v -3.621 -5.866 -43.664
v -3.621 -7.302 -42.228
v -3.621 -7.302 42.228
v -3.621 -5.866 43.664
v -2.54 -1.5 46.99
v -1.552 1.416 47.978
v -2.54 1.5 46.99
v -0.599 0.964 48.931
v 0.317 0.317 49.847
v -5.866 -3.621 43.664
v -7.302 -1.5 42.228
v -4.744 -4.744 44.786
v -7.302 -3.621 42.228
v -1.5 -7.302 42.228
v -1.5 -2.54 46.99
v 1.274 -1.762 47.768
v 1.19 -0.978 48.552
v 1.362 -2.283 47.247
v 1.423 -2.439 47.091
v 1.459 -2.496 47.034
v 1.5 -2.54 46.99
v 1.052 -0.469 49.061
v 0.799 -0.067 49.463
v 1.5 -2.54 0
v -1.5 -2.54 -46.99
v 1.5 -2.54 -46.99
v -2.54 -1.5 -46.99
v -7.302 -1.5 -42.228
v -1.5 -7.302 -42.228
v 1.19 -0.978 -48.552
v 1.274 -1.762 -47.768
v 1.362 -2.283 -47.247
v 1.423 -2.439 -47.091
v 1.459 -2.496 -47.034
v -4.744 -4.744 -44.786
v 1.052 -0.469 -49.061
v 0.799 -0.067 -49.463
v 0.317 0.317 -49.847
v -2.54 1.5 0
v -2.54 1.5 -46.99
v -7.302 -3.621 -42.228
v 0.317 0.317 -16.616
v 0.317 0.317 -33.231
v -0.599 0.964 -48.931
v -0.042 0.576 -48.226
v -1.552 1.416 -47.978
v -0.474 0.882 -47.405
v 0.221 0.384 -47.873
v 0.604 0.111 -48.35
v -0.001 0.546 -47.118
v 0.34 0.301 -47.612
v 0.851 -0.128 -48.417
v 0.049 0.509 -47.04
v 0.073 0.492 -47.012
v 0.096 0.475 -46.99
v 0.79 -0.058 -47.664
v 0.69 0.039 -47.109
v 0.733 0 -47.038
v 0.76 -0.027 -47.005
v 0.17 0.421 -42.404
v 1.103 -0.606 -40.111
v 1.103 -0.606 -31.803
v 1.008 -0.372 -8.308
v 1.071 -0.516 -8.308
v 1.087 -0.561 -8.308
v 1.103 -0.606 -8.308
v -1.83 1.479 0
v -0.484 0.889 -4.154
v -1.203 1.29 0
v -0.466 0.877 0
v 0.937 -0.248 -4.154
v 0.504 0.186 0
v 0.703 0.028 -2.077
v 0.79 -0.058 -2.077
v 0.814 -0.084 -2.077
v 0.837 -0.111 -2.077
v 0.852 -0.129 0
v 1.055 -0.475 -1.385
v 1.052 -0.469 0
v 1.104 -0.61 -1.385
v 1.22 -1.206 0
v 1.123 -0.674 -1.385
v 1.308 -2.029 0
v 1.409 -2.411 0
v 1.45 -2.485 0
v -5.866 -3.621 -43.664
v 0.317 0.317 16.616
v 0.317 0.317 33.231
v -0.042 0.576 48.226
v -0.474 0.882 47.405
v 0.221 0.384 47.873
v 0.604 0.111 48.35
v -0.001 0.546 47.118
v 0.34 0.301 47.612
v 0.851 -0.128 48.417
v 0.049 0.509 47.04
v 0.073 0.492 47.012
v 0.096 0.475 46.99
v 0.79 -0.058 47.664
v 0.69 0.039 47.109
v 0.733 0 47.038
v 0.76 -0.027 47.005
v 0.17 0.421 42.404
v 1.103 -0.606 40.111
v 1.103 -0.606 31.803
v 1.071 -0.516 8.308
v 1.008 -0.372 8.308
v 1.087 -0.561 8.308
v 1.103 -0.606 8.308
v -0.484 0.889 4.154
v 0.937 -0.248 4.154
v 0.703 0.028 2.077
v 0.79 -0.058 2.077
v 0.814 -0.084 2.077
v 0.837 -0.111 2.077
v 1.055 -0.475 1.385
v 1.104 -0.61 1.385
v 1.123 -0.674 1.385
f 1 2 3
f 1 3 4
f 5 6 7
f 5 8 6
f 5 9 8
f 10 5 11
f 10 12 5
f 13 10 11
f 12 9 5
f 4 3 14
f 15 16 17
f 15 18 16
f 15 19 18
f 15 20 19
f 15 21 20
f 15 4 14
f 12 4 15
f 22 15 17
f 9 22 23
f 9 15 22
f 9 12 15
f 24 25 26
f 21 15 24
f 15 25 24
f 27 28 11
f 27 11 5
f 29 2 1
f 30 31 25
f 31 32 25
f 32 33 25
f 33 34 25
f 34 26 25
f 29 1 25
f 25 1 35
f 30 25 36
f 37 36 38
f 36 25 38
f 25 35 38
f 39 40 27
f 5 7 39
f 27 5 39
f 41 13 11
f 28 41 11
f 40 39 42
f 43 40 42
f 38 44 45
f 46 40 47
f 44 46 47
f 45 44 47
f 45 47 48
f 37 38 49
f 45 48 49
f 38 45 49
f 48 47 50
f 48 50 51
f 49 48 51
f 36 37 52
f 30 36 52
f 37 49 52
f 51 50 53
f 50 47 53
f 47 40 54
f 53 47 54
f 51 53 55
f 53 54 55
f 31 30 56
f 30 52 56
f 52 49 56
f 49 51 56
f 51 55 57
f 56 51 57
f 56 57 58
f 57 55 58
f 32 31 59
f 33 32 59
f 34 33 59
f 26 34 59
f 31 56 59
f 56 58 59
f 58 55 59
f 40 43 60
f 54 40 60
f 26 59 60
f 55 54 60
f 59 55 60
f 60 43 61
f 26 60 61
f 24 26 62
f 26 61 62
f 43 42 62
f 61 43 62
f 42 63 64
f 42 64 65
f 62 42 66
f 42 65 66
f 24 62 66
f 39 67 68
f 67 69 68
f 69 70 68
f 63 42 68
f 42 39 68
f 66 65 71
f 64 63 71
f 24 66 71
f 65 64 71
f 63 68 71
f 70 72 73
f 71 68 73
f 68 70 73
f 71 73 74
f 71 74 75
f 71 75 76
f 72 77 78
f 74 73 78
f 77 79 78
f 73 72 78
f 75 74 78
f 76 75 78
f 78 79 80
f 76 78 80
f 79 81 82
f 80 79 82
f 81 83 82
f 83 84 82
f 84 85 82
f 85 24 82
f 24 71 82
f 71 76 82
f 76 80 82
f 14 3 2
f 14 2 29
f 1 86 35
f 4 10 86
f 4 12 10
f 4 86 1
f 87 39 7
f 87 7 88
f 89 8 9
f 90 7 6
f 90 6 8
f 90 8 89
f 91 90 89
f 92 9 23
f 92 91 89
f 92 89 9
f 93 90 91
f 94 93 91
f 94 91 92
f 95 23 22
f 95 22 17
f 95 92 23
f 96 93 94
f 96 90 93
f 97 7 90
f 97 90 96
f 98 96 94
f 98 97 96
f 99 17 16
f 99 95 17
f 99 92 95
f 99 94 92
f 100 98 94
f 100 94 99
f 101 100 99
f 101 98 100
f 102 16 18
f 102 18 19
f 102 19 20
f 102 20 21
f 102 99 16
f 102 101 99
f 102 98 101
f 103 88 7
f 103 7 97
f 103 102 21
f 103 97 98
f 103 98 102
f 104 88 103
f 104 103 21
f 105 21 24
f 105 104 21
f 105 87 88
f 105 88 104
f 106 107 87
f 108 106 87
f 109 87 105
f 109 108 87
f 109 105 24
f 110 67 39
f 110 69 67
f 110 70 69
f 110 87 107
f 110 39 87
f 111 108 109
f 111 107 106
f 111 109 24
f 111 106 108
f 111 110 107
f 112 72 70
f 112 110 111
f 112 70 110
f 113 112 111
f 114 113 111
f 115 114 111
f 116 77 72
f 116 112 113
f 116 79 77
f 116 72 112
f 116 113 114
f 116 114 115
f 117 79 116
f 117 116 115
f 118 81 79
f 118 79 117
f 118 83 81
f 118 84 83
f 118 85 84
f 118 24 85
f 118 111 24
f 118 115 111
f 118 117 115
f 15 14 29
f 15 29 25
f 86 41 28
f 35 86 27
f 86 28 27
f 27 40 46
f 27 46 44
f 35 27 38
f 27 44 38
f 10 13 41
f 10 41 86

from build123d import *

# Parameters (mm, degrees)
SKETCH7_W               = 4.7625
SKETCH7_H               = 2.12122512
BOSS_EXTRUDE2_DEPTH     = 52.705
SKETCH8_W               = 2.12122512
SKETCH8_H               = 4.7625
BOSS_EXTRUDE3_DEPTH     = 52.705
BOSS_EXTRUDE4_DEPTH     = 52.705
CUT_EXTRUDE4_DEPTH      = 54.707262553
CUT_EXTRUDE4_DEPTH_BACK = 54.707262553
CUT_EXTRUDE5_DEPTH      = 53.064517001
CUT_EXTRUDE5_DEPTH_BACK = 53.064517001


with BuildPart() as part:
    # Sketch7 → Boss-Extrude2 (new, symmetric)
    with BuildSketch(Plane.XY):
        with Locations((-4.92125, -2.560612608)):
            Rectangle(SKETCH7_W, SKETCH7_H)
    extrude(amount=BOSS_EXTRUDE2_DEPTH, both=True)

    # Sketch8 → Boss-Extrude3 (add, symmetric)
    with BuildSketch(Plane.XY):
        with Locations((-2.560612608, -4.92125)):
            Rectangle(SKETCH8_W, SKETCH8_H)
    extrude(amount=BOSS_EXTRUDE3_DEPTH, both=True)

    # Sketch11 → Boss-Extrude4 (add, symmetric)
    with BuildSketch(Plane.XY):
        with BuildLine():
            Line((-2.54, 1.500000048), (-2.54, -1.500000048))
            Line((-2.54, -1.500000048), (-7.3025, -1.500000048))
            Line((-7.3025, -1.500000048), (-7.3025, -3.621225168))
            Line((-7.3025, -3.621225168), (-5.866289198, -3.621225168))
            Line((-5.866289198, -3.621225168), (-3.621225168, -5.866289198))
            Line((-3.621225168, -5.866289198), (-3.621225168, -7.3025))
            Line((-3.621225168, -7.3025), (-1.500000048, -7.3025))
            Line((-1.500000048, -7.3025), (-1.500000048, -2.54))
            Line((-1.500000048, -2.54), (1.500000048, -2.54))
            add(Edge.make_bspline(
                [(-2.54, 1.500000048), (-1.295649087, 1.635512934), (-0.042467258, 0.473225958), (1.297713539, -0.292226779), (1.263724591, -2.340394541), (1.500000048, -2.54)],
                knots=[0, 0, 0, 0, 0.496686972, 0.741346965, 0.899739924, 0.899739924, 0.899739924, 0.899739924], degree=3))
        make_face()
    extrude(amount=BOSS_EXTRUDE4_DEPTH, both=True)

    # Sketch14 → Cut-Extrude4 (cut, two sides: drawn at the far end of the back side and taken through both)
    with BuildSketch(Plane(origin=(0, 0, 0), x_dir=(1, 0, 0), z_dir=(0, 1, 0)).offset(-CUT_EXTRUDE4_DEPTH_BACK)):
        Polygon((-7.3025, -42.2275), (-7.3025, -56.8325), (7.3025, -56.8325), align=None)
        Polygon((-7.3025, 42.2275), (7.3025, 56.8325), (-7.3025, 56.8325), align=None)
    extrude(amount=CUT_EXTRUDE4_DEPTH + CUT_EXTRUDE4_DEPTH_BACK, mode=Mode.SUBTRACT)

    # Sketch17 → Cut-Extrude5 (cut, two sides: drawn at the far end of the back side and taken through both)
    with BuildSketch(Plane(origin=(0, 0, 0), x_dir=(0, -1, 0), z_dir=(-1, 0, 0)).offset(-CUT_EXTRUDE5_DEPTH_BACK)):
        Polygon((7.3025, 56.8325), (7.3025, 42.2275), (-7.3025, 56.8325), align=None)
        Polygon((7.3025, -42.2275), (-7.3025, -56.8325), (7.3025, -56.8325), align=None)
    extrude(amount=CUT_EXTRUDE5_DEPTH + CUT_EXTRUDE5_DEPTH_BACK, mode=Mode.SUBTRACT)


solid = part.part
